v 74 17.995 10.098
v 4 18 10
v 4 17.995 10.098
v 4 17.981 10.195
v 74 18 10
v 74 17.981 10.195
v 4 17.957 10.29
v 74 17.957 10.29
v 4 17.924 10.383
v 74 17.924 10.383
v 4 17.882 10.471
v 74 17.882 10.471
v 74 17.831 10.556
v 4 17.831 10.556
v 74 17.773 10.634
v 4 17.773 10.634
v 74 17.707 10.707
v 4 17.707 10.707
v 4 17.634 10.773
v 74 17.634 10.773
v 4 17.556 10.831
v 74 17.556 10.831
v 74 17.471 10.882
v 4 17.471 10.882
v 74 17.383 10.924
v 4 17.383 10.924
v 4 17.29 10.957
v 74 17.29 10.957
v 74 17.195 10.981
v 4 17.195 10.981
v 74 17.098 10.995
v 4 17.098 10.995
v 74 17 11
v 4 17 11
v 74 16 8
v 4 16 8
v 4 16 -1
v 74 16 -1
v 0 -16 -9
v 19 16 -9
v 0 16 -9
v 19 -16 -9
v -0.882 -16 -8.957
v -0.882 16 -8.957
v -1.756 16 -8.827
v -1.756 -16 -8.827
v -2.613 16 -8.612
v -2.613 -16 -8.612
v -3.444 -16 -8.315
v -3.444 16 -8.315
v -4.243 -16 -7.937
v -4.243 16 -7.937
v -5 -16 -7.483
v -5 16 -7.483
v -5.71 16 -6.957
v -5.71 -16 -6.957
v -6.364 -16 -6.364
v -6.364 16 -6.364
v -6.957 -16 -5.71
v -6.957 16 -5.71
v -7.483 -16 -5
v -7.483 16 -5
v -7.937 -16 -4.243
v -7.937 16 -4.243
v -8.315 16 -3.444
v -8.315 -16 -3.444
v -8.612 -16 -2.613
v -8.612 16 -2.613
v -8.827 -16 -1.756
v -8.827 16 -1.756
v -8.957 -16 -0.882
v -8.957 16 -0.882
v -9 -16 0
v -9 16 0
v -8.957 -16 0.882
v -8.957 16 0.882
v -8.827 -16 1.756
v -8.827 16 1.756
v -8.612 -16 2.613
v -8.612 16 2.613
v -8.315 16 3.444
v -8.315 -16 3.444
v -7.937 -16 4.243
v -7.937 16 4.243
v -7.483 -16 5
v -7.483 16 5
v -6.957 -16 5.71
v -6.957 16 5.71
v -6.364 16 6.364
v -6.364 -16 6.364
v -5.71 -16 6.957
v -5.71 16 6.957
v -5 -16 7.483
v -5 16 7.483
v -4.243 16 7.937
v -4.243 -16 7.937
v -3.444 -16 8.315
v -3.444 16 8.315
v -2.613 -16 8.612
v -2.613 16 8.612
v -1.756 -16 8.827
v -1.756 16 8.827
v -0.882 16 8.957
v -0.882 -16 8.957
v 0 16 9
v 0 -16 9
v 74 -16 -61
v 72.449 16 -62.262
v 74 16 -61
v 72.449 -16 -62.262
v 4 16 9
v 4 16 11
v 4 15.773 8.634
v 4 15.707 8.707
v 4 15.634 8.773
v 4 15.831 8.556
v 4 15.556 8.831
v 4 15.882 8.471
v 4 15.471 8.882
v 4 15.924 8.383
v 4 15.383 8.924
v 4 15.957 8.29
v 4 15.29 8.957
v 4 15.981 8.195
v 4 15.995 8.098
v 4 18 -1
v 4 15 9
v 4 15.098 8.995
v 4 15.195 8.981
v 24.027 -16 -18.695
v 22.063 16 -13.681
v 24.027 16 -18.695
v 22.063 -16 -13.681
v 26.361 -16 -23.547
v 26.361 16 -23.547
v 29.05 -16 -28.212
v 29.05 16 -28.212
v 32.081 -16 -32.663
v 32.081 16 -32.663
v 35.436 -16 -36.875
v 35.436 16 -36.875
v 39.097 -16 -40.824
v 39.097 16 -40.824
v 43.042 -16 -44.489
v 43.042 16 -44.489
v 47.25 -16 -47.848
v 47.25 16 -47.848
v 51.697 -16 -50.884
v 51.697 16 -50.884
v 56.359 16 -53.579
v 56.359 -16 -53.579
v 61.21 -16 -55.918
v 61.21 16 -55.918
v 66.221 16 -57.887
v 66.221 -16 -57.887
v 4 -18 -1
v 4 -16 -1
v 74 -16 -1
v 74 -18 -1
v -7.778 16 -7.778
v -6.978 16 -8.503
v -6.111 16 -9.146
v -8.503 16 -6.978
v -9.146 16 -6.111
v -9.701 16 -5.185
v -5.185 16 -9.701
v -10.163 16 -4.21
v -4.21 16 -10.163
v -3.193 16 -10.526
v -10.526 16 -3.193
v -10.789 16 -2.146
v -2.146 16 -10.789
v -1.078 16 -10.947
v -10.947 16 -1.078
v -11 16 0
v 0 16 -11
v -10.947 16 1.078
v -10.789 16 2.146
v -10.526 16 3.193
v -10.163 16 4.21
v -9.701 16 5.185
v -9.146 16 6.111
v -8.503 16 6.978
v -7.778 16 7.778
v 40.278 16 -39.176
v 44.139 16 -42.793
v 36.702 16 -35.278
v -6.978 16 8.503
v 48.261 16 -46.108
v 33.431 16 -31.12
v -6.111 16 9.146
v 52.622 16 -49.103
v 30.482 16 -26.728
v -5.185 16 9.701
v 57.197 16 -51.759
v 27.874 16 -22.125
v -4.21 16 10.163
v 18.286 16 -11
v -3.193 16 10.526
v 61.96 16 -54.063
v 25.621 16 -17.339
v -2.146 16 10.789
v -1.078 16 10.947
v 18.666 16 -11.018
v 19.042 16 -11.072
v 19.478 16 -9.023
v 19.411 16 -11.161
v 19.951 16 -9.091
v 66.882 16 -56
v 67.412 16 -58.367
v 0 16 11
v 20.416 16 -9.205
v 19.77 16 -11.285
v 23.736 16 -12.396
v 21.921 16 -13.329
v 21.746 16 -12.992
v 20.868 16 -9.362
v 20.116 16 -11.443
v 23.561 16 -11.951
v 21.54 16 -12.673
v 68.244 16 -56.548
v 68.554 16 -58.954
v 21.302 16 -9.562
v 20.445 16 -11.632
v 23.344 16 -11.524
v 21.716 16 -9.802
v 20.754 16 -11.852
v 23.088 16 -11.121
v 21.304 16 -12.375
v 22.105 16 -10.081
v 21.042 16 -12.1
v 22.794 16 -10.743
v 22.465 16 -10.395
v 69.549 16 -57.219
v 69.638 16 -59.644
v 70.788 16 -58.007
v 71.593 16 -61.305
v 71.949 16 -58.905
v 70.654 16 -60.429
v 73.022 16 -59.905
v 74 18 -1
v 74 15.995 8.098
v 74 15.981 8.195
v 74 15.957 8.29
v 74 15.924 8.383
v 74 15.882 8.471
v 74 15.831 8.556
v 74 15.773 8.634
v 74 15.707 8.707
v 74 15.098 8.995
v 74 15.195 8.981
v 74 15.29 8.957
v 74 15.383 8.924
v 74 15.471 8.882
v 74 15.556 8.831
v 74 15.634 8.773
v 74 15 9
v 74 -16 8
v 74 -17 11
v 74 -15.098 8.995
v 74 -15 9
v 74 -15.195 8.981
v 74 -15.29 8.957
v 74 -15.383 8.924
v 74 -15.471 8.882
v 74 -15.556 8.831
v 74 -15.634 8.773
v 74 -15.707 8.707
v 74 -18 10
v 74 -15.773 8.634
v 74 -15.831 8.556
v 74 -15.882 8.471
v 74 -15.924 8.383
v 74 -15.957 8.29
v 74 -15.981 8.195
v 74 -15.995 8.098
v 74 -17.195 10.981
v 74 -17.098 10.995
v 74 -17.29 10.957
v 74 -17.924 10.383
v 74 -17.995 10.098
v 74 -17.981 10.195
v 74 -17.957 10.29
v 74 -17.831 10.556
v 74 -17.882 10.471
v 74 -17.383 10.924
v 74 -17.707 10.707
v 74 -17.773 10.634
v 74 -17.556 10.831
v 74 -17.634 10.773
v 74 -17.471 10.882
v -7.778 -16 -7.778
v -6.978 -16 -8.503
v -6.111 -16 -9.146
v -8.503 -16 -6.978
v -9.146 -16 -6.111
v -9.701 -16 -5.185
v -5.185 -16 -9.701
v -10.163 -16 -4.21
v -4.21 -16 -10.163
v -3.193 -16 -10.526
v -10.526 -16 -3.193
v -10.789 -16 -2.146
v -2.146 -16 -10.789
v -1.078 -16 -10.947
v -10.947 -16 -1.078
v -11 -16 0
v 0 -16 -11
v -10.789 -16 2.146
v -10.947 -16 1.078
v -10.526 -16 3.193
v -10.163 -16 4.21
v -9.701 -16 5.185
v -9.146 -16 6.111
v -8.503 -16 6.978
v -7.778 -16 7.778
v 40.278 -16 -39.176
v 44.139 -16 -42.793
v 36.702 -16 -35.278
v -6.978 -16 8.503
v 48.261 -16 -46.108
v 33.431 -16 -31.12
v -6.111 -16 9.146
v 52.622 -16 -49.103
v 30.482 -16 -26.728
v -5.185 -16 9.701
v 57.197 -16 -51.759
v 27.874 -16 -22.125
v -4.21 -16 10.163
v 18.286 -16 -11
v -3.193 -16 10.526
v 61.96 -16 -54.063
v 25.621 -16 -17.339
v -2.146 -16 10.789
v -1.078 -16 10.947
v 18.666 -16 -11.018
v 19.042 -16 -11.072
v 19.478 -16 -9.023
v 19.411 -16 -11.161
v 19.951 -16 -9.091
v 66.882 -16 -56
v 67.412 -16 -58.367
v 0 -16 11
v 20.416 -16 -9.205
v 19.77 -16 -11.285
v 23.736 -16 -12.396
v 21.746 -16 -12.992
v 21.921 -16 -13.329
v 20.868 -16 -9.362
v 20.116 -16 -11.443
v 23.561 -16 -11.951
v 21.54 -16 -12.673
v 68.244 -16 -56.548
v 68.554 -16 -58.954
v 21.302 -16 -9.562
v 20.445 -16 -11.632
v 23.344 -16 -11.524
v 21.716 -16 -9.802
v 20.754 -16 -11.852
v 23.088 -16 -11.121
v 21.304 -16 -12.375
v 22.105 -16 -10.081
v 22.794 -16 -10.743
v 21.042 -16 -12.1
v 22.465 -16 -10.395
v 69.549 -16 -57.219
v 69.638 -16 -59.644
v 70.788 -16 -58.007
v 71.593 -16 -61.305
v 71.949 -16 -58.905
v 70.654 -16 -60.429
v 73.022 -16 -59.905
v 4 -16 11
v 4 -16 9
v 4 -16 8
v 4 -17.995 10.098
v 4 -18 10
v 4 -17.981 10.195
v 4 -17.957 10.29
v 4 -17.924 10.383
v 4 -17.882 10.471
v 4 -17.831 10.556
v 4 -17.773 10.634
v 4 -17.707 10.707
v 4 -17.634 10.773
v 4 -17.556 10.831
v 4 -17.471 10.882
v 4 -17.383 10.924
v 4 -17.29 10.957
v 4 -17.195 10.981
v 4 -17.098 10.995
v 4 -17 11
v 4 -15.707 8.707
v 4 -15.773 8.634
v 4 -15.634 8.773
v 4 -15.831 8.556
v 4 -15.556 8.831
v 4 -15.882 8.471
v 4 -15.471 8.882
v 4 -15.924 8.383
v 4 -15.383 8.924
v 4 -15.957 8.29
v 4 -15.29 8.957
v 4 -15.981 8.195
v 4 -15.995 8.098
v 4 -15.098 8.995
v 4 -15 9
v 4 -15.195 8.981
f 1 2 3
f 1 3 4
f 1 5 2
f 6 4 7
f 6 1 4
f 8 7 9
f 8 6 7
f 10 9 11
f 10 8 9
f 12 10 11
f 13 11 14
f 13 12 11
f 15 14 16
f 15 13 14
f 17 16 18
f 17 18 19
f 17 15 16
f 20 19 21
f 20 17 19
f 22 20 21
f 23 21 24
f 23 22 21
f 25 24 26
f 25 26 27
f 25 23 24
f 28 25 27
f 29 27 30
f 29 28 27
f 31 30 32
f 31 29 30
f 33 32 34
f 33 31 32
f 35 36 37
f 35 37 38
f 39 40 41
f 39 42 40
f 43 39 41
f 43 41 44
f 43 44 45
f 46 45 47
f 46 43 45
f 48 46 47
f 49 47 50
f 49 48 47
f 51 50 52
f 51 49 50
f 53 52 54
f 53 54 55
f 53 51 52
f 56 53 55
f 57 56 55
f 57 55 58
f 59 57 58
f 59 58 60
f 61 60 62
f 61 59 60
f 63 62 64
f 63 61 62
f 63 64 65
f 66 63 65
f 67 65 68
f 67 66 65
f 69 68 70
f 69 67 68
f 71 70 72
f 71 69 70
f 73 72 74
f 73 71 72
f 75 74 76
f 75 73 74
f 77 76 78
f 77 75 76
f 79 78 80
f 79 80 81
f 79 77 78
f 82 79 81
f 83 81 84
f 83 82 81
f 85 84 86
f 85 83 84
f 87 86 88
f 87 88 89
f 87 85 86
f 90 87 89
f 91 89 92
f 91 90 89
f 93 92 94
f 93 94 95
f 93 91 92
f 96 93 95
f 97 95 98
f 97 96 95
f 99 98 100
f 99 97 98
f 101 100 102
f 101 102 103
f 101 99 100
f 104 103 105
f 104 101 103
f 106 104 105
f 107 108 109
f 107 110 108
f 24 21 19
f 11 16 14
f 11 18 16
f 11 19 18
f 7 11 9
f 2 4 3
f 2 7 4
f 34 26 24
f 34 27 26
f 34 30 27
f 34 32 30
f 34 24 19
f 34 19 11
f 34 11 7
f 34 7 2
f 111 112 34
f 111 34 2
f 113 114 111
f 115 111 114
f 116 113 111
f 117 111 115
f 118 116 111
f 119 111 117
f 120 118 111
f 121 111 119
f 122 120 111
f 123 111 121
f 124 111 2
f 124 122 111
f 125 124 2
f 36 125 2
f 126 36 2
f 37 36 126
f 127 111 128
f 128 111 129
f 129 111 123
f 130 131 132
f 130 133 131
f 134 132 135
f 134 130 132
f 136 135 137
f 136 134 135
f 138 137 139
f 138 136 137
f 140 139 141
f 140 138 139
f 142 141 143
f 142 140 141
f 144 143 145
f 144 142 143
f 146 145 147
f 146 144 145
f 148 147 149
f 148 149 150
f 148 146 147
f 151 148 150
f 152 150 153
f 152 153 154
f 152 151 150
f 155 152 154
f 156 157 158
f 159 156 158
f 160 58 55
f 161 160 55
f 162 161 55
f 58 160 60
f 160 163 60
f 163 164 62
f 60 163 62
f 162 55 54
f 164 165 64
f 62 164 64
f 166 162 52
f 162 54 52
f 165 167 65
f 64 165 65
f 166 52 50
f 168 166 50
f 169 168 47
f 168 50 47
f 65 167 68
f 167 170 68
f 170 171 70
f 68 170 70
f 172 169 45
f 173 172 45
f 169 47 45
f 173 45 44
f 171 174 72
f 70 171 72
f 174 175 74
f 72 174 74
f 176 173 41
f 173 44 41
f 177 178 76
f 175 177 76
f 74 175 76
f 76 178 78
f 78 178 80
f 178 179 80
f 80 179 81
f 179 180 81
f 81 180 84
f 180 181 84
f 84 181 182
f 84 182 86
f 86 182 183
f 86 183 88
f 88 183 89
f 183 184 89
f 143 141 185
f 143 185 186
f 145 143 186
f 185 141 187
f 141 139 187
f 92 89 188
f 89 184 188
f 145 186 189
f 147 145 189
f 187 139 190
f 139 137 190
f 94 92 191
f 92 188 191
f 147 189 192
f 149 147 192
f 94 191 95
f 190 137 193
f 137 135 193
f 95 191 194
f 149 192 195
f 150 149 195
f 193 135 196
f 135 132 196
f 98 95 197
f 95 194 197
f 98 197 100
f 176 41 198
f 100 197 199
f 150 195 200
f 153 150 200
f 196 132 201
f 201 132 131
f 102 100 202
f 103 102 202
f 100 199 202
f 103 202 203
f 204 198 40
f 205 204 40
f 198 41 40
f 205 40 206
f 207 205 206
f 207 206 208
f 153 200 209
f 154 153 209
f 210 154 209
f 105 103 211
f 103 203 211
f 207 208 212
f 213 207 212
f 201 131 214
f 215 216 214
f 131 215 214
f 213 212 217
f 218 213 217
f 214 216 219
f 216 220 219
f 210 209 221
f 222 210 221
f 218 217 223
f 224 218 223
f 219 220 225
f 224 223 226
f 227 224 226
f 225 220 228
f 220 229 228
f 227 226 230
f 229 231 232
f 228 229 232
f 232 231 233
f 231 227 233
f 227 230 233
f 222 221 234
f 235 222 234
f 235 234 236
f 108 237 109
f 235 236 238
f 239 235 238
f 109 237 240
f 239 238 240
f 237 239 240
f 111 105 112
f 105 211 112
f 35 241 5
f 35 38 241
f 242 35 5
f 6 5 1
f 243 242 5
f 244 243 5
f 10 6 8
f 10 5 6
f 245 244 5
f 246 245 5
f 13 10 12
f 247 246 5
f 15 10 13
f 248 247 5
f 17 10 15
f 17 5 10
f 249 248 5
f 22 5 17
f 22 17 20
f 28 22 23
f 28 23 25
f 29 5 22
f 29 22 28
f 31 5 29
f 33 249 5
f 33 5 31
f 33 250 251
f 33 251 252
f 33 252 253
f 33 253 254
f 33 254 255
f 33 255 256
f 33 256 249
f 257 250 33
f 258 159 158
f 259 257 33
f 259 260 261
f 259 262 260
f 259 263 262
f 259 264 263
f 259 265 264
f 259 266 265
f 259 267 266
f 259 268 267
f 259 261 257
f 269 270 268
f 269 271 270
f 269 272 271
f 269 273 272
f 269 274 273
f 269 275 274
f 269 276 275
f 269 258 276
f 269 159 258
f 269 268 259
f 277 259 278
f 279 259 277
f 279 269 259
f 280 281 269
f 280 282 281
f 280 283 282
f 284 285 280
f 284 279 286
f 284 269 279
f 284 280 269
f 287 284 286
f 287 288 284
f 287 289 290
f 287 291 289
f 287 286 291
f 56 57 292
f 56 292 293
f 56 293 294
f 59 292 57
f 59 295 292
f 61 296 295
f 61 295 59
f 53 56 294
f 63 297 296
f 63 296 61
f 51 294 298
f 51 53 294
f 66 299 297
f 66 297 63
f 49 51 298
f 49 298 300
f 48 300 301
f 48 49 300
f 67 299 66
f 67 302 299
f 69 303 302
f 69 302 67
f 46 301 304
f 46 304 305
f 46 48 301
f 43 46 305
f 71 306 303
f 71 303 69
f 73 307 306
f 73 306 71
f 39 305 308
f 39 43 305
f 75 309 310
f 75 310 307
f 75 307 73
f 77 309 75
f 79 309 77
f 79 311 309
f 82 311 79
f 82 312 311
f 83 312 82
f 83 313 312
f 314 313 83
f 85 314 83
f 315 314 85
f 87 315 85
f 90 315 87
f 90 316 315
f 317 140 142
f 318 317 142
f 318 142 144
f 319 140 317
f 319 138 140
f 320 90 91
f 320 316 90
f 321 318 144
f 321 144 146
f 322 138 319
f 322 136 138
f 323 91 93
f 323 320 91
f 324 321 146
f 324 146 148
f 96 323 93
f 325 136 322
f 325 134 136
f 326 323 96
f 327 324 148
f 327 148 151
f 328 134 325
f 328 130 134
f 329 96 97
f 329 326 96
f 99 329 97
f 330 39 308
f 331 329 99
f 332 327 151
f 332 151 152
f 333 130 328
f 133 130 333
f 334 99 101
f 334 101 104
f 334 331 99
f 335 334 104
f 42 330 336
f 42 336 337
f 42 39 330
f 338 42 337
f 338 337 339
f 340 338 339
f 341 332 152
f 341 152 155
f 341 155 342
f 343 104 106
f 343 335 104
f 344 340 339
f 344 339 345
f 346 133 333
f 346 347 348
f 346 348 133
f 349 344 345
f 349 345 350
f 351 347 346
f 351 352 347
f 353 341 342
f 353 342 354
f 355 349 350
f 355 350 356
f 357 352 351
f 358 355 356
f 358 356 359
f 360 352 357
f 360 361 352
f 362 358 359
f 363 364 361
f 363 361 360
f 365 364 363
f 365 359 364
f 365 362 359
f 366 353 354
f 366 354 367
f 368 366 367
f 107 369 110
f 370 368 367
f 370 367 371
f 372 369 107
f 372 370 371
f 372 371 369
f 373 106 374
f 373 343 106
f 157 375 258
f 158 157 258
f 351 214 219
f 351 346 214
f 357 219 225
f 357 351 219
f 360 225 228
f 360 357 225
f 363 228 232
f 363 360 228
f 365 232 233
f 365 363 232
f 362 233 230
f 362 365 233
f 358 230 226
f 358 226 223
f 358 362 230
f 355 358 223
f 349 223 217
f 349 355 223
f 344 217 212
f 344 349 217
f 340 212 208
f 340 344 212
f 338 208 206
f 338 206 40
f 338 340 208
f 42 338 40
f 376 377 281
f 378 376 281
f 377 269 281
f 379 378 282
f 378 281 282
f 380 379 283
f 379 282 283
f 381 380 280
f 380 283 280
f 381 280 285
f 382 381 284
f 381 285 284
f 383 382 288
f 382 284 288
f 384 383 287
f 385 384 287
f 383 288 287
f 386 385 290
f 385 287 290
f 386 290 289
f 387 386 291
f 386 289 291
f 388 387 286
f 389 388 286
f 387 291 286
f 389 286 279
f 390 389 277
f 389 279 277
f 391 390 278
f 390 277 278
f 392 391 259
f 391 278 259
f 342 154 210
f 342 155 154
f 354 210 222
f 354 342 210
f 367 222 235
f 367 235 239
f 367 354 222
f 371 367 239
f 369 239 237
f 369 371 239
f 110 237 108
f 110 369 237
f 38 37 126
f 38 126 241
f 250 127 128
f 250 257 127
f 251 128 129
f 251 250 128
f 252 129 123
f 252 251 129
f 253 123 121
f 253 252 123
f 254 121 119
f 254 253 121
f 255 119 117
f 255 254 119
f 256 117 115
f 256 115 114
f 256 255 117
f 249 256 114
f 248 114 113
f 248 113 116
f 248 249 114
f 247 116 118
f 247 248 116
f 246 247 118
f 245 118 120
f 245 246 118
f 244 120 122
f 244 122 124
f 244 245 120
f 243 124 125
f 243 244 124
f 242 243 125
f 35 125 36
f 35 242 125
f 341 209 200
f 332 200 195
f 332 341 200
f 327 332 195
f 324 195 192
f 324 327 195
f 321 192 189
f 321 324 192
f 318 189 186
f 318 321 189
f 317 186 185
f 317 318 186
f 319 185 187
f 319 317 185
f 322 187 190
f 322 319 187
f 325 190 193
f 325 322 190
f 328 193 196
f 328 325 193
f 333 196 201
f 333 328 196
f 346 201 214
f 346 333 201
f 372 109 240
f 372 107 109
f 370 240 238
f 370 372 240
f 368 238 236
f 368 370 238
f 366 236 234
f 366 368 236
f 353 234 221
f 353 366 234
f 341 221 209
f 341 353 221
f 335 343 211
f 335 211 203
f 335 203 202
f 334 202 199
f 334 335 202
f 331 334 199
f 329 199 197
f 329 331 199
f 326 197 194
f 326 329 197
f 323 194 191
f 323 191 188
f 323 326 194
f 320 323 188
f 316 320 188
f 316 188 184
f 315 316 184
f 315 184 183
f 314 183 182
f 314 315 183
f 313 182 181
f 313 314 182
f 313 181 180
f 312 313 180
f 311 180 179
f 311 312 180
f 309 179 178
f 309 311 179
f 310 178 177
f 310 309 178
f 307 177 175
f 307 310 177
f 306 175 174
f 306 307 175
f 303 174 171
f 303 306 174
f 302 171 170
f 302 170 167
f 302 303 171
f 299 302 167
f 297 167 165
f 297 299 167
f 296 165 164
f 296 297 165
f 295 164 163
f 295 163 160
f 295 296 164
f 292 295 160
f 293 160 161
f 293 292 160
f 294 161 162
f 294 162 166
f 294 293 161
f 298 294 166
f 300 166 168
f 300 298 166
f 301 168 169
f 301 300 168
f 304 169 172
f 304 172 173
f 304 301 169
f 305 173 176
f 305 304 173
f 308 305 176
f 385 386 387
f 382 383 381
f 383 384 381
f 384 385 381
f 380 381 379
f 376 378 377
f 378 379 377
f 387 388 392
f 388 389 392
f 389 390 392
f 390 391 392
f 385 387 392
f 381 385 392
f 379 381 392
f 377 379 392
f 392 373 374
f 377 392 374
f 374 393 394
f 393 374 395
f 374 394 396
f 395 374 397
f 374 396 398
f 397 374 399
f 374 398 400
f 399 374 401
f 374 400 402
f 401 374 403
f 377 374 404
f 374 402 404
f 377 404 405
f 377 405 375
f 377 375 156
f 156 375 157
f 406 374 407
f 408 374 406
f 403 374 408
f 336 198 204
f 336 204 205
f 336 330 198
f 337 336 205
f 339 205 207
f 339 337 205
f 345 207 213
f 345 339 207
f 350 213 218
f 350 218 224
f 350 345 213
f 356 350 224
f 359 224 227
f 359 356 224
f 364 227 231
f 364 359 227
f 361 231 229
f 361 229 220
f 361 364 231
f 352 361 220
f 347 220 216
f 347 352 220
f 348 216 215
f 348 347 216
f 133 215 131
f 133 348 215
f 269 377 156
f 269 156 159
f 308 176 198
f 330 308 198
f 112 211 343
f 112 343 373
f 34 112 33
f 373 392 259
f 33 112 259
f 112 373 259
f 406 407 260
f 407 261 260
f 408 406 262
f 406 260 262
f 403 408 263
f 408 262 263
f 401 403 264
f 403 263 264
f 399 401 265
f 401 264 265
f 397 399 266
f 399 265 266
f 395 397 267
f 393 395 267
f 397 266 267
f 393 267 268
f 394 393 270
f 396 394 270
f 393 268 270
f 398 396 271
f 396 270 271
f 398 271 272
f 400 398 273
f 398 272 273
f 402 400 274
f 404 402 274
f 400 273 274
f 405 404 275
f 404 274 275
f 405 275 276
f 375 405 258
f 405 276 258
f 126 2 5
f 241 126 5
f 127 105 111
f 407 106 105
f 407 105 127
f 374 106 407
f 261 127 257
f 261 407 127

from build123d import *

# Parameters (mm, degrees)
F1_DEPTH = 16
F2_W     = 70
F2_H     = 2
F2_H_2   = 10
F3_DEPTH = 2
F4_R     = 1


with BuildPart() as f1:
    # F0 (on Front) → F1 (new body)
    with BuildSketch(Plane.XZ):
        with BuildLine():
            ThreePointArc((0, -9), (-9, 0), (0, 9))
            Line((0, 9), (74, 9))
            Line((74, 9), (74, 11))
            Line((74, 11), (0, 11))
            ThreePointArc((0, 11), (-11, 0), (0, -11))
            Line((0, -11), (18.2864816057, -11))
            ThreePointArc((18.2864816057, -11), (20.6021054823, -11.7384227646), (22.0627746665, -13.6810569689))
            ThreePointArc((22.0627746665, -13.6810569689), (39.0966080524, -40.824002055), (66.2209606463, -57.8874262169))
            ThreePointArc((66.2209606463, -57.8874262169), (69.6378774832, -59.6435957626), (72.4487811093, -62.2624262169))
            Line((72.4487811093, -62.2624262169), (74, -61))
            ThreePointArc((74, -61), (70.7875387131, -58.0070509094), (66.8824908995, -56))
            ThreePointArc((66.8824908995, -56), (40.2783781222, -39.1759850939), (23.7357366507, -12.396005494))
            ThreePointArc((23.7357366507, -12.396005494), (21.9137628138, -9.9367517594), (19, -9))
            Line((19, -9), (0, -9))
        make_face()
    extrude(amount=F1_DEPTH)

    # F2 (on face) → F3 (join)
    with BuildSketch(Plane.XZ.offset(16)):
        with Locations((39, 10)):
            Rectangle(F2_W, F2_H)
        with Locations((39, 4)):
            Rectangle(F2_W, F2_H_2)
    extrude(amount=F3_DEPTH)

    # F4
    f4_edges = [f1.edges().sort_by_distance(p)[0] for p in [
        (39, -18, 11),
        (39, -16, 9),
    ]]
    fillet(f4_edges, radius=F4_R)

    # F5: F1 across plane


with BuildPart() as f1_1:
    add(f1.part)
    add(f1.part.mirror(Plane.XZ))


solid = f1_1.part
